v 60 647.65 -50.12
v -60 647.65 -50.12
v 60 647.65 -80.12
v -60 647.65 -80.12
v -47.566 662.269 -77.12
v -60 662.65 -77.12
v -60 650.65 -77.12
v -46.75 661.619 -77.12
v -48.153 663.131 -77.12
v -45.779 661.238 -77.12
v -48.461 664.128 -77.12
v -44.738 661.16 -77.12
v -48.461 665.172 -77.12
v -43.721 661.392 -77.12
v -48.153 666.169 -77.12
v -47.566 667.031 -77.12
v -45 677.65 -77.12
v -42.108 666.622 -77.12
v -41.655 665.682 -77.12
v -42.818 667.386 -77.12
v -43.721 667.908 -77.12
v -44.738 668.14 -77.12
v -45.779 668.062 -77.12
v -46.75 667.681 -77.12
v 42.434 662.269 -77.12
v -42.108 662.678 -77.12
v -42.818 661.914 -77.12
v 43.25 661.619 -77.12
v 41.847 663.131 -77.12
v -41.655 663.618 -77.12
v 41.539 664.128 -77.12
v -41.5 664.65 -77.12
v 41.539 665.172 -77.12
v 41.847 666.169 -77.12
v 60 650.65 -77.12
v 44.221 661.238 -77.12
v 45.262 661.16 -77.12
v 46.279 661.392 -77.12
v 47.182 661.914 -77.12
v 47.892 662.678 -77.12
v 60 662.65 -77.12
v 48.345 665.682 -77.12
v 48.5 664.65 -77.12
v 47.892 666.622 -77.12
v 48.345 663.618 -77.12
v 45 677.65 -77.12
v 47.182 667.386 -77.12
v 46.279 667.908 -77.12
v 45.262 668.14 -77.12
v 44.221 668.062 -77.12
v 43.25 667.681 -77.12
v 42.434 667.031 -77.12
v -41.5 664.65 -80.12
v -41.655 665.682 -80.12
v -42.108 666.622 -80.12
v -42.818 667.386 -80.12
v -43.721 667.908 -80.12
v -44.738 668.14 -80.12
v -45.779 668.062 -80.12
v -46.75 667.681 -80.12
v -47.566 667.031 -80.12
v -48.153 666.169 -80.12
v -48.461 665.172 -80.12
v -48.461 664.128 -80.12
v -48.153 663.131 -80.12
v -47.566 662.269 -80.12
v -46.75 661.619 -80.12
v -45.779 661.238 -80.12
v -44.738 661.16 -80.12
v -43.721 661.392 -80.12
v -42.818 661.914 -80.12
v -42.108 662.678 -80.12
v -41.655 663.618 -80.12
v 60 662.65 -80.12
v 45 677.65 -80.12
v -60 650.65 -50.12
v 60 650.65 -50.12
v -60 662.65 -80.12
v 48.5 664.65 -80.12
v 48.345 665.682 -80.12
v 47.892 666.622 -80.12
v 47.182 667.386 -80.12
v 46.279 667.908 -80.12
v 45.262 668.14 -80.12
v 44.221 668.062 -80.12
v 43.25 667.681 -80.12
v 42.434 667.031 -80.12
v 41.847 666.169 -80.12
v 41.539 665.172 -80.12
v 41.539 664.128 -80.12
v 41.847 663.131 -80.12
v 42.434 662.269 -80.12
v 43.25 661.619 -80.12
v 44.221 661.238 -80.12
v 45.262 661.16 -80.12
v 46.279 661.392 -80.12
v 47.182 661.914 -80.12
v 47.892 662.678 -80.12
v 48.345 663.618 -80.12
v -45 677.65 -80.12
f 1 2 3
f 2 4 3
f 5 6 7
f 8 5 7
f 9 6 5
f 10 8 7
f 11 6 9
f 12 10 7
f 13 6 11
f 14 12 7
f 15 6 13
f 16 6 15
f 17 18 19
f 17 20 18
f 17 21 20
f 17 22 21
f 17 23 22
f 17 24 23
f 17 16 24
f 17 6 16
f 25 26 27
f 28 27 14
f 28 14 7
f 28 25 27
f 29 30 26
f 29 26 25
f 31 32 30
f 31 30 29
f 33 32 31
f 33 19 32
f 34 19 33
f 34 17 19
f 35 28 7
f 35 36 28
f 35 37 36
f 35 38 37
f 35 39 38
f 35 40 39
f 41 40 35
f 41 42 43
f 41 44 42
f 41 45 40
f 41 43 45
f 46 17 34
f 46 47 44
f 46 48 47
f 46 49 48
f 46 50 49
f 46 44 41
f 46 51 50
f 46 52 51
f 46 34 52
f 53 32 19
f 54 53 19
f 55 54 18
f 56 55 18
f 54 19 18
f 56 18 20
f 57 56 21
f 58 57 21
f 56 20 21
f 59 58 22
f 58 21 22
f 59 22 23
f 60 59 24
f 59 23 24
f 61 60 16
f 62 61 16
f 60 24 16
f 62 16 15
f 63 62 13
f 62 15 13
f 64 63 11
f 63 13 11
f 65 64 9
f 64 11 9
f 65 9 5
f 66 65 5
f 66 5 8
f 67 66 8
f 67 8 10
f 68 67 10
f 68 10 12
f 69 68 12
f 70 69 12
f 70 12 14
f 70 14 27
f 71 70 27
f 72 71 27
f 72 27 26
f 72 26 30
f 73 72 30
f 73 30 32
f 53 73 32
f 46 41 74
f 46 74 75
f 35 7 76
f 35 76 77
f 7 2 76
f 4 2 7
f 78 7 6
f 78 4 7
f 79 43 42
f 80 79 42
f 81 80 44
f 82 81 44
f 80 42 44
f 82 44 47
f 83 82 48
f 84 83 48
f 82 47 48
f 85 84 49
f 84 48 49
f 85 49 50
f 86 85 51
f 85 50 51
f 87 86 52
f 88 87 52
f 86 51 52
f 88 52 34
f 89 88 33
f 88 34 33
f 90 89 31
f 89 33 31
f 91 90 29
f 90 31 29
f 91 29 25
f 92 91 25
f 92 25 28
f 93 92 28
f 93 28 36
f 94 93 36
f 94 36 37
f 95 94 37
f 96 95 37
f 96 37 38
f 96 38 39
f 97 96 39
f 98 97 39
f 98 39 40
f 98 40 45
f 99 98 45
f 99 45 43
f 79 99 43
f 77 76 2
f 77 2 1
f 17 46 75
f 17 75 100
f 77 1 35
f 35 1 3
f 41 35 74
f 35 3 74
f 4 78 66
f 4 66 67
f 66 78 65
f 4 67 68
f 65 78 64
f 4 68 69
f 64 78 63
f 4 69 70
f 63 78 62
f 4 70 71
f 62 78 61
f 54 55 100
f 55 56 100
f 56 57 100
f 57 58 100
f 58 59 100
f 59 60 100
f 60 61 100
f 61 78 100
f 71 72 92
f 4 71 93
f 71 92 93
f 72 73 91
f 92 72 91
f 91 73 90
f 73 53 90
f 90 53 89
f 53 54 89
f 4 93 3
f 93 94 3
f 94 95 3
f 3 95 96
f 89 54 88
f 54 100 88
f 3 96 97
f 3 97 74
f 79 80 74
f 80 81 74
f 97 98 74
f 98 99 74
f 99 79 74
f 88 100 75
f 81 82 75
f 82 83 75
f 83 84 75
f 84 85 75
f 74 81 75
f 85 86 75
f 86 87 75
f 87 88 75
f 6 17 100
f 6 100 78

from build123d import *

# Parameters (mm, degrees)
SALIENTE_EXTRUIR1_DEPTH           = 3
CROQUIS2_W                        = 120
CROQUIS2_H                        = 3
SALIENTE_EXTRUIR2_DEPTH           = 27
DI_METRO_DE_TALADRO_7_0_7_1_D     = 7
DI_METRO_DE_TALADRO_7_0_7_1_DEPTH = 30


with BuildPart() as part:
    # Croquis1 → Saliente-Extruir1 (new body)
    with BuildSketch(Plane.XY.offset(-77.120136034)):
        Polygon((-60, 662.649987793), (-60, 647.649987793), (60, 647.649987793), (60, 662.649987793), (45, 677.649987793), (-45, 677.649987793), align=None)
    extrude(amount=-SALIENTE_EXTRUIR1_DEPTH)

    # Croquis2 → Saliente-Extruir2 (add)
    with BuildSketch(Plane.XY.offset(-77.120136034)):
        with Locations((0, 649.149987793)):
            Rectangle(CROQUIS2_W, CROQUIS2_H)
    extrude(amount=SALIENTE_EXTRUIR2_DEPTH)

    # Diámetro de taladro Ø7.0 (7)1
    with Locations(Plane(origin=(0, 0, -80.120136034), x_dir=(-1, 0, 0), z_dir=(0, 0, -1))):
        with Locations((45, 664.649987793), (-45, 664.649987793)):
            Hole(DI_METRO_DE_TALADRO_7_0_7_1_D / 2, depth=DI_METRO_DE_TALADRO_7_0_7_1_DEPTH)


solid = part.part
